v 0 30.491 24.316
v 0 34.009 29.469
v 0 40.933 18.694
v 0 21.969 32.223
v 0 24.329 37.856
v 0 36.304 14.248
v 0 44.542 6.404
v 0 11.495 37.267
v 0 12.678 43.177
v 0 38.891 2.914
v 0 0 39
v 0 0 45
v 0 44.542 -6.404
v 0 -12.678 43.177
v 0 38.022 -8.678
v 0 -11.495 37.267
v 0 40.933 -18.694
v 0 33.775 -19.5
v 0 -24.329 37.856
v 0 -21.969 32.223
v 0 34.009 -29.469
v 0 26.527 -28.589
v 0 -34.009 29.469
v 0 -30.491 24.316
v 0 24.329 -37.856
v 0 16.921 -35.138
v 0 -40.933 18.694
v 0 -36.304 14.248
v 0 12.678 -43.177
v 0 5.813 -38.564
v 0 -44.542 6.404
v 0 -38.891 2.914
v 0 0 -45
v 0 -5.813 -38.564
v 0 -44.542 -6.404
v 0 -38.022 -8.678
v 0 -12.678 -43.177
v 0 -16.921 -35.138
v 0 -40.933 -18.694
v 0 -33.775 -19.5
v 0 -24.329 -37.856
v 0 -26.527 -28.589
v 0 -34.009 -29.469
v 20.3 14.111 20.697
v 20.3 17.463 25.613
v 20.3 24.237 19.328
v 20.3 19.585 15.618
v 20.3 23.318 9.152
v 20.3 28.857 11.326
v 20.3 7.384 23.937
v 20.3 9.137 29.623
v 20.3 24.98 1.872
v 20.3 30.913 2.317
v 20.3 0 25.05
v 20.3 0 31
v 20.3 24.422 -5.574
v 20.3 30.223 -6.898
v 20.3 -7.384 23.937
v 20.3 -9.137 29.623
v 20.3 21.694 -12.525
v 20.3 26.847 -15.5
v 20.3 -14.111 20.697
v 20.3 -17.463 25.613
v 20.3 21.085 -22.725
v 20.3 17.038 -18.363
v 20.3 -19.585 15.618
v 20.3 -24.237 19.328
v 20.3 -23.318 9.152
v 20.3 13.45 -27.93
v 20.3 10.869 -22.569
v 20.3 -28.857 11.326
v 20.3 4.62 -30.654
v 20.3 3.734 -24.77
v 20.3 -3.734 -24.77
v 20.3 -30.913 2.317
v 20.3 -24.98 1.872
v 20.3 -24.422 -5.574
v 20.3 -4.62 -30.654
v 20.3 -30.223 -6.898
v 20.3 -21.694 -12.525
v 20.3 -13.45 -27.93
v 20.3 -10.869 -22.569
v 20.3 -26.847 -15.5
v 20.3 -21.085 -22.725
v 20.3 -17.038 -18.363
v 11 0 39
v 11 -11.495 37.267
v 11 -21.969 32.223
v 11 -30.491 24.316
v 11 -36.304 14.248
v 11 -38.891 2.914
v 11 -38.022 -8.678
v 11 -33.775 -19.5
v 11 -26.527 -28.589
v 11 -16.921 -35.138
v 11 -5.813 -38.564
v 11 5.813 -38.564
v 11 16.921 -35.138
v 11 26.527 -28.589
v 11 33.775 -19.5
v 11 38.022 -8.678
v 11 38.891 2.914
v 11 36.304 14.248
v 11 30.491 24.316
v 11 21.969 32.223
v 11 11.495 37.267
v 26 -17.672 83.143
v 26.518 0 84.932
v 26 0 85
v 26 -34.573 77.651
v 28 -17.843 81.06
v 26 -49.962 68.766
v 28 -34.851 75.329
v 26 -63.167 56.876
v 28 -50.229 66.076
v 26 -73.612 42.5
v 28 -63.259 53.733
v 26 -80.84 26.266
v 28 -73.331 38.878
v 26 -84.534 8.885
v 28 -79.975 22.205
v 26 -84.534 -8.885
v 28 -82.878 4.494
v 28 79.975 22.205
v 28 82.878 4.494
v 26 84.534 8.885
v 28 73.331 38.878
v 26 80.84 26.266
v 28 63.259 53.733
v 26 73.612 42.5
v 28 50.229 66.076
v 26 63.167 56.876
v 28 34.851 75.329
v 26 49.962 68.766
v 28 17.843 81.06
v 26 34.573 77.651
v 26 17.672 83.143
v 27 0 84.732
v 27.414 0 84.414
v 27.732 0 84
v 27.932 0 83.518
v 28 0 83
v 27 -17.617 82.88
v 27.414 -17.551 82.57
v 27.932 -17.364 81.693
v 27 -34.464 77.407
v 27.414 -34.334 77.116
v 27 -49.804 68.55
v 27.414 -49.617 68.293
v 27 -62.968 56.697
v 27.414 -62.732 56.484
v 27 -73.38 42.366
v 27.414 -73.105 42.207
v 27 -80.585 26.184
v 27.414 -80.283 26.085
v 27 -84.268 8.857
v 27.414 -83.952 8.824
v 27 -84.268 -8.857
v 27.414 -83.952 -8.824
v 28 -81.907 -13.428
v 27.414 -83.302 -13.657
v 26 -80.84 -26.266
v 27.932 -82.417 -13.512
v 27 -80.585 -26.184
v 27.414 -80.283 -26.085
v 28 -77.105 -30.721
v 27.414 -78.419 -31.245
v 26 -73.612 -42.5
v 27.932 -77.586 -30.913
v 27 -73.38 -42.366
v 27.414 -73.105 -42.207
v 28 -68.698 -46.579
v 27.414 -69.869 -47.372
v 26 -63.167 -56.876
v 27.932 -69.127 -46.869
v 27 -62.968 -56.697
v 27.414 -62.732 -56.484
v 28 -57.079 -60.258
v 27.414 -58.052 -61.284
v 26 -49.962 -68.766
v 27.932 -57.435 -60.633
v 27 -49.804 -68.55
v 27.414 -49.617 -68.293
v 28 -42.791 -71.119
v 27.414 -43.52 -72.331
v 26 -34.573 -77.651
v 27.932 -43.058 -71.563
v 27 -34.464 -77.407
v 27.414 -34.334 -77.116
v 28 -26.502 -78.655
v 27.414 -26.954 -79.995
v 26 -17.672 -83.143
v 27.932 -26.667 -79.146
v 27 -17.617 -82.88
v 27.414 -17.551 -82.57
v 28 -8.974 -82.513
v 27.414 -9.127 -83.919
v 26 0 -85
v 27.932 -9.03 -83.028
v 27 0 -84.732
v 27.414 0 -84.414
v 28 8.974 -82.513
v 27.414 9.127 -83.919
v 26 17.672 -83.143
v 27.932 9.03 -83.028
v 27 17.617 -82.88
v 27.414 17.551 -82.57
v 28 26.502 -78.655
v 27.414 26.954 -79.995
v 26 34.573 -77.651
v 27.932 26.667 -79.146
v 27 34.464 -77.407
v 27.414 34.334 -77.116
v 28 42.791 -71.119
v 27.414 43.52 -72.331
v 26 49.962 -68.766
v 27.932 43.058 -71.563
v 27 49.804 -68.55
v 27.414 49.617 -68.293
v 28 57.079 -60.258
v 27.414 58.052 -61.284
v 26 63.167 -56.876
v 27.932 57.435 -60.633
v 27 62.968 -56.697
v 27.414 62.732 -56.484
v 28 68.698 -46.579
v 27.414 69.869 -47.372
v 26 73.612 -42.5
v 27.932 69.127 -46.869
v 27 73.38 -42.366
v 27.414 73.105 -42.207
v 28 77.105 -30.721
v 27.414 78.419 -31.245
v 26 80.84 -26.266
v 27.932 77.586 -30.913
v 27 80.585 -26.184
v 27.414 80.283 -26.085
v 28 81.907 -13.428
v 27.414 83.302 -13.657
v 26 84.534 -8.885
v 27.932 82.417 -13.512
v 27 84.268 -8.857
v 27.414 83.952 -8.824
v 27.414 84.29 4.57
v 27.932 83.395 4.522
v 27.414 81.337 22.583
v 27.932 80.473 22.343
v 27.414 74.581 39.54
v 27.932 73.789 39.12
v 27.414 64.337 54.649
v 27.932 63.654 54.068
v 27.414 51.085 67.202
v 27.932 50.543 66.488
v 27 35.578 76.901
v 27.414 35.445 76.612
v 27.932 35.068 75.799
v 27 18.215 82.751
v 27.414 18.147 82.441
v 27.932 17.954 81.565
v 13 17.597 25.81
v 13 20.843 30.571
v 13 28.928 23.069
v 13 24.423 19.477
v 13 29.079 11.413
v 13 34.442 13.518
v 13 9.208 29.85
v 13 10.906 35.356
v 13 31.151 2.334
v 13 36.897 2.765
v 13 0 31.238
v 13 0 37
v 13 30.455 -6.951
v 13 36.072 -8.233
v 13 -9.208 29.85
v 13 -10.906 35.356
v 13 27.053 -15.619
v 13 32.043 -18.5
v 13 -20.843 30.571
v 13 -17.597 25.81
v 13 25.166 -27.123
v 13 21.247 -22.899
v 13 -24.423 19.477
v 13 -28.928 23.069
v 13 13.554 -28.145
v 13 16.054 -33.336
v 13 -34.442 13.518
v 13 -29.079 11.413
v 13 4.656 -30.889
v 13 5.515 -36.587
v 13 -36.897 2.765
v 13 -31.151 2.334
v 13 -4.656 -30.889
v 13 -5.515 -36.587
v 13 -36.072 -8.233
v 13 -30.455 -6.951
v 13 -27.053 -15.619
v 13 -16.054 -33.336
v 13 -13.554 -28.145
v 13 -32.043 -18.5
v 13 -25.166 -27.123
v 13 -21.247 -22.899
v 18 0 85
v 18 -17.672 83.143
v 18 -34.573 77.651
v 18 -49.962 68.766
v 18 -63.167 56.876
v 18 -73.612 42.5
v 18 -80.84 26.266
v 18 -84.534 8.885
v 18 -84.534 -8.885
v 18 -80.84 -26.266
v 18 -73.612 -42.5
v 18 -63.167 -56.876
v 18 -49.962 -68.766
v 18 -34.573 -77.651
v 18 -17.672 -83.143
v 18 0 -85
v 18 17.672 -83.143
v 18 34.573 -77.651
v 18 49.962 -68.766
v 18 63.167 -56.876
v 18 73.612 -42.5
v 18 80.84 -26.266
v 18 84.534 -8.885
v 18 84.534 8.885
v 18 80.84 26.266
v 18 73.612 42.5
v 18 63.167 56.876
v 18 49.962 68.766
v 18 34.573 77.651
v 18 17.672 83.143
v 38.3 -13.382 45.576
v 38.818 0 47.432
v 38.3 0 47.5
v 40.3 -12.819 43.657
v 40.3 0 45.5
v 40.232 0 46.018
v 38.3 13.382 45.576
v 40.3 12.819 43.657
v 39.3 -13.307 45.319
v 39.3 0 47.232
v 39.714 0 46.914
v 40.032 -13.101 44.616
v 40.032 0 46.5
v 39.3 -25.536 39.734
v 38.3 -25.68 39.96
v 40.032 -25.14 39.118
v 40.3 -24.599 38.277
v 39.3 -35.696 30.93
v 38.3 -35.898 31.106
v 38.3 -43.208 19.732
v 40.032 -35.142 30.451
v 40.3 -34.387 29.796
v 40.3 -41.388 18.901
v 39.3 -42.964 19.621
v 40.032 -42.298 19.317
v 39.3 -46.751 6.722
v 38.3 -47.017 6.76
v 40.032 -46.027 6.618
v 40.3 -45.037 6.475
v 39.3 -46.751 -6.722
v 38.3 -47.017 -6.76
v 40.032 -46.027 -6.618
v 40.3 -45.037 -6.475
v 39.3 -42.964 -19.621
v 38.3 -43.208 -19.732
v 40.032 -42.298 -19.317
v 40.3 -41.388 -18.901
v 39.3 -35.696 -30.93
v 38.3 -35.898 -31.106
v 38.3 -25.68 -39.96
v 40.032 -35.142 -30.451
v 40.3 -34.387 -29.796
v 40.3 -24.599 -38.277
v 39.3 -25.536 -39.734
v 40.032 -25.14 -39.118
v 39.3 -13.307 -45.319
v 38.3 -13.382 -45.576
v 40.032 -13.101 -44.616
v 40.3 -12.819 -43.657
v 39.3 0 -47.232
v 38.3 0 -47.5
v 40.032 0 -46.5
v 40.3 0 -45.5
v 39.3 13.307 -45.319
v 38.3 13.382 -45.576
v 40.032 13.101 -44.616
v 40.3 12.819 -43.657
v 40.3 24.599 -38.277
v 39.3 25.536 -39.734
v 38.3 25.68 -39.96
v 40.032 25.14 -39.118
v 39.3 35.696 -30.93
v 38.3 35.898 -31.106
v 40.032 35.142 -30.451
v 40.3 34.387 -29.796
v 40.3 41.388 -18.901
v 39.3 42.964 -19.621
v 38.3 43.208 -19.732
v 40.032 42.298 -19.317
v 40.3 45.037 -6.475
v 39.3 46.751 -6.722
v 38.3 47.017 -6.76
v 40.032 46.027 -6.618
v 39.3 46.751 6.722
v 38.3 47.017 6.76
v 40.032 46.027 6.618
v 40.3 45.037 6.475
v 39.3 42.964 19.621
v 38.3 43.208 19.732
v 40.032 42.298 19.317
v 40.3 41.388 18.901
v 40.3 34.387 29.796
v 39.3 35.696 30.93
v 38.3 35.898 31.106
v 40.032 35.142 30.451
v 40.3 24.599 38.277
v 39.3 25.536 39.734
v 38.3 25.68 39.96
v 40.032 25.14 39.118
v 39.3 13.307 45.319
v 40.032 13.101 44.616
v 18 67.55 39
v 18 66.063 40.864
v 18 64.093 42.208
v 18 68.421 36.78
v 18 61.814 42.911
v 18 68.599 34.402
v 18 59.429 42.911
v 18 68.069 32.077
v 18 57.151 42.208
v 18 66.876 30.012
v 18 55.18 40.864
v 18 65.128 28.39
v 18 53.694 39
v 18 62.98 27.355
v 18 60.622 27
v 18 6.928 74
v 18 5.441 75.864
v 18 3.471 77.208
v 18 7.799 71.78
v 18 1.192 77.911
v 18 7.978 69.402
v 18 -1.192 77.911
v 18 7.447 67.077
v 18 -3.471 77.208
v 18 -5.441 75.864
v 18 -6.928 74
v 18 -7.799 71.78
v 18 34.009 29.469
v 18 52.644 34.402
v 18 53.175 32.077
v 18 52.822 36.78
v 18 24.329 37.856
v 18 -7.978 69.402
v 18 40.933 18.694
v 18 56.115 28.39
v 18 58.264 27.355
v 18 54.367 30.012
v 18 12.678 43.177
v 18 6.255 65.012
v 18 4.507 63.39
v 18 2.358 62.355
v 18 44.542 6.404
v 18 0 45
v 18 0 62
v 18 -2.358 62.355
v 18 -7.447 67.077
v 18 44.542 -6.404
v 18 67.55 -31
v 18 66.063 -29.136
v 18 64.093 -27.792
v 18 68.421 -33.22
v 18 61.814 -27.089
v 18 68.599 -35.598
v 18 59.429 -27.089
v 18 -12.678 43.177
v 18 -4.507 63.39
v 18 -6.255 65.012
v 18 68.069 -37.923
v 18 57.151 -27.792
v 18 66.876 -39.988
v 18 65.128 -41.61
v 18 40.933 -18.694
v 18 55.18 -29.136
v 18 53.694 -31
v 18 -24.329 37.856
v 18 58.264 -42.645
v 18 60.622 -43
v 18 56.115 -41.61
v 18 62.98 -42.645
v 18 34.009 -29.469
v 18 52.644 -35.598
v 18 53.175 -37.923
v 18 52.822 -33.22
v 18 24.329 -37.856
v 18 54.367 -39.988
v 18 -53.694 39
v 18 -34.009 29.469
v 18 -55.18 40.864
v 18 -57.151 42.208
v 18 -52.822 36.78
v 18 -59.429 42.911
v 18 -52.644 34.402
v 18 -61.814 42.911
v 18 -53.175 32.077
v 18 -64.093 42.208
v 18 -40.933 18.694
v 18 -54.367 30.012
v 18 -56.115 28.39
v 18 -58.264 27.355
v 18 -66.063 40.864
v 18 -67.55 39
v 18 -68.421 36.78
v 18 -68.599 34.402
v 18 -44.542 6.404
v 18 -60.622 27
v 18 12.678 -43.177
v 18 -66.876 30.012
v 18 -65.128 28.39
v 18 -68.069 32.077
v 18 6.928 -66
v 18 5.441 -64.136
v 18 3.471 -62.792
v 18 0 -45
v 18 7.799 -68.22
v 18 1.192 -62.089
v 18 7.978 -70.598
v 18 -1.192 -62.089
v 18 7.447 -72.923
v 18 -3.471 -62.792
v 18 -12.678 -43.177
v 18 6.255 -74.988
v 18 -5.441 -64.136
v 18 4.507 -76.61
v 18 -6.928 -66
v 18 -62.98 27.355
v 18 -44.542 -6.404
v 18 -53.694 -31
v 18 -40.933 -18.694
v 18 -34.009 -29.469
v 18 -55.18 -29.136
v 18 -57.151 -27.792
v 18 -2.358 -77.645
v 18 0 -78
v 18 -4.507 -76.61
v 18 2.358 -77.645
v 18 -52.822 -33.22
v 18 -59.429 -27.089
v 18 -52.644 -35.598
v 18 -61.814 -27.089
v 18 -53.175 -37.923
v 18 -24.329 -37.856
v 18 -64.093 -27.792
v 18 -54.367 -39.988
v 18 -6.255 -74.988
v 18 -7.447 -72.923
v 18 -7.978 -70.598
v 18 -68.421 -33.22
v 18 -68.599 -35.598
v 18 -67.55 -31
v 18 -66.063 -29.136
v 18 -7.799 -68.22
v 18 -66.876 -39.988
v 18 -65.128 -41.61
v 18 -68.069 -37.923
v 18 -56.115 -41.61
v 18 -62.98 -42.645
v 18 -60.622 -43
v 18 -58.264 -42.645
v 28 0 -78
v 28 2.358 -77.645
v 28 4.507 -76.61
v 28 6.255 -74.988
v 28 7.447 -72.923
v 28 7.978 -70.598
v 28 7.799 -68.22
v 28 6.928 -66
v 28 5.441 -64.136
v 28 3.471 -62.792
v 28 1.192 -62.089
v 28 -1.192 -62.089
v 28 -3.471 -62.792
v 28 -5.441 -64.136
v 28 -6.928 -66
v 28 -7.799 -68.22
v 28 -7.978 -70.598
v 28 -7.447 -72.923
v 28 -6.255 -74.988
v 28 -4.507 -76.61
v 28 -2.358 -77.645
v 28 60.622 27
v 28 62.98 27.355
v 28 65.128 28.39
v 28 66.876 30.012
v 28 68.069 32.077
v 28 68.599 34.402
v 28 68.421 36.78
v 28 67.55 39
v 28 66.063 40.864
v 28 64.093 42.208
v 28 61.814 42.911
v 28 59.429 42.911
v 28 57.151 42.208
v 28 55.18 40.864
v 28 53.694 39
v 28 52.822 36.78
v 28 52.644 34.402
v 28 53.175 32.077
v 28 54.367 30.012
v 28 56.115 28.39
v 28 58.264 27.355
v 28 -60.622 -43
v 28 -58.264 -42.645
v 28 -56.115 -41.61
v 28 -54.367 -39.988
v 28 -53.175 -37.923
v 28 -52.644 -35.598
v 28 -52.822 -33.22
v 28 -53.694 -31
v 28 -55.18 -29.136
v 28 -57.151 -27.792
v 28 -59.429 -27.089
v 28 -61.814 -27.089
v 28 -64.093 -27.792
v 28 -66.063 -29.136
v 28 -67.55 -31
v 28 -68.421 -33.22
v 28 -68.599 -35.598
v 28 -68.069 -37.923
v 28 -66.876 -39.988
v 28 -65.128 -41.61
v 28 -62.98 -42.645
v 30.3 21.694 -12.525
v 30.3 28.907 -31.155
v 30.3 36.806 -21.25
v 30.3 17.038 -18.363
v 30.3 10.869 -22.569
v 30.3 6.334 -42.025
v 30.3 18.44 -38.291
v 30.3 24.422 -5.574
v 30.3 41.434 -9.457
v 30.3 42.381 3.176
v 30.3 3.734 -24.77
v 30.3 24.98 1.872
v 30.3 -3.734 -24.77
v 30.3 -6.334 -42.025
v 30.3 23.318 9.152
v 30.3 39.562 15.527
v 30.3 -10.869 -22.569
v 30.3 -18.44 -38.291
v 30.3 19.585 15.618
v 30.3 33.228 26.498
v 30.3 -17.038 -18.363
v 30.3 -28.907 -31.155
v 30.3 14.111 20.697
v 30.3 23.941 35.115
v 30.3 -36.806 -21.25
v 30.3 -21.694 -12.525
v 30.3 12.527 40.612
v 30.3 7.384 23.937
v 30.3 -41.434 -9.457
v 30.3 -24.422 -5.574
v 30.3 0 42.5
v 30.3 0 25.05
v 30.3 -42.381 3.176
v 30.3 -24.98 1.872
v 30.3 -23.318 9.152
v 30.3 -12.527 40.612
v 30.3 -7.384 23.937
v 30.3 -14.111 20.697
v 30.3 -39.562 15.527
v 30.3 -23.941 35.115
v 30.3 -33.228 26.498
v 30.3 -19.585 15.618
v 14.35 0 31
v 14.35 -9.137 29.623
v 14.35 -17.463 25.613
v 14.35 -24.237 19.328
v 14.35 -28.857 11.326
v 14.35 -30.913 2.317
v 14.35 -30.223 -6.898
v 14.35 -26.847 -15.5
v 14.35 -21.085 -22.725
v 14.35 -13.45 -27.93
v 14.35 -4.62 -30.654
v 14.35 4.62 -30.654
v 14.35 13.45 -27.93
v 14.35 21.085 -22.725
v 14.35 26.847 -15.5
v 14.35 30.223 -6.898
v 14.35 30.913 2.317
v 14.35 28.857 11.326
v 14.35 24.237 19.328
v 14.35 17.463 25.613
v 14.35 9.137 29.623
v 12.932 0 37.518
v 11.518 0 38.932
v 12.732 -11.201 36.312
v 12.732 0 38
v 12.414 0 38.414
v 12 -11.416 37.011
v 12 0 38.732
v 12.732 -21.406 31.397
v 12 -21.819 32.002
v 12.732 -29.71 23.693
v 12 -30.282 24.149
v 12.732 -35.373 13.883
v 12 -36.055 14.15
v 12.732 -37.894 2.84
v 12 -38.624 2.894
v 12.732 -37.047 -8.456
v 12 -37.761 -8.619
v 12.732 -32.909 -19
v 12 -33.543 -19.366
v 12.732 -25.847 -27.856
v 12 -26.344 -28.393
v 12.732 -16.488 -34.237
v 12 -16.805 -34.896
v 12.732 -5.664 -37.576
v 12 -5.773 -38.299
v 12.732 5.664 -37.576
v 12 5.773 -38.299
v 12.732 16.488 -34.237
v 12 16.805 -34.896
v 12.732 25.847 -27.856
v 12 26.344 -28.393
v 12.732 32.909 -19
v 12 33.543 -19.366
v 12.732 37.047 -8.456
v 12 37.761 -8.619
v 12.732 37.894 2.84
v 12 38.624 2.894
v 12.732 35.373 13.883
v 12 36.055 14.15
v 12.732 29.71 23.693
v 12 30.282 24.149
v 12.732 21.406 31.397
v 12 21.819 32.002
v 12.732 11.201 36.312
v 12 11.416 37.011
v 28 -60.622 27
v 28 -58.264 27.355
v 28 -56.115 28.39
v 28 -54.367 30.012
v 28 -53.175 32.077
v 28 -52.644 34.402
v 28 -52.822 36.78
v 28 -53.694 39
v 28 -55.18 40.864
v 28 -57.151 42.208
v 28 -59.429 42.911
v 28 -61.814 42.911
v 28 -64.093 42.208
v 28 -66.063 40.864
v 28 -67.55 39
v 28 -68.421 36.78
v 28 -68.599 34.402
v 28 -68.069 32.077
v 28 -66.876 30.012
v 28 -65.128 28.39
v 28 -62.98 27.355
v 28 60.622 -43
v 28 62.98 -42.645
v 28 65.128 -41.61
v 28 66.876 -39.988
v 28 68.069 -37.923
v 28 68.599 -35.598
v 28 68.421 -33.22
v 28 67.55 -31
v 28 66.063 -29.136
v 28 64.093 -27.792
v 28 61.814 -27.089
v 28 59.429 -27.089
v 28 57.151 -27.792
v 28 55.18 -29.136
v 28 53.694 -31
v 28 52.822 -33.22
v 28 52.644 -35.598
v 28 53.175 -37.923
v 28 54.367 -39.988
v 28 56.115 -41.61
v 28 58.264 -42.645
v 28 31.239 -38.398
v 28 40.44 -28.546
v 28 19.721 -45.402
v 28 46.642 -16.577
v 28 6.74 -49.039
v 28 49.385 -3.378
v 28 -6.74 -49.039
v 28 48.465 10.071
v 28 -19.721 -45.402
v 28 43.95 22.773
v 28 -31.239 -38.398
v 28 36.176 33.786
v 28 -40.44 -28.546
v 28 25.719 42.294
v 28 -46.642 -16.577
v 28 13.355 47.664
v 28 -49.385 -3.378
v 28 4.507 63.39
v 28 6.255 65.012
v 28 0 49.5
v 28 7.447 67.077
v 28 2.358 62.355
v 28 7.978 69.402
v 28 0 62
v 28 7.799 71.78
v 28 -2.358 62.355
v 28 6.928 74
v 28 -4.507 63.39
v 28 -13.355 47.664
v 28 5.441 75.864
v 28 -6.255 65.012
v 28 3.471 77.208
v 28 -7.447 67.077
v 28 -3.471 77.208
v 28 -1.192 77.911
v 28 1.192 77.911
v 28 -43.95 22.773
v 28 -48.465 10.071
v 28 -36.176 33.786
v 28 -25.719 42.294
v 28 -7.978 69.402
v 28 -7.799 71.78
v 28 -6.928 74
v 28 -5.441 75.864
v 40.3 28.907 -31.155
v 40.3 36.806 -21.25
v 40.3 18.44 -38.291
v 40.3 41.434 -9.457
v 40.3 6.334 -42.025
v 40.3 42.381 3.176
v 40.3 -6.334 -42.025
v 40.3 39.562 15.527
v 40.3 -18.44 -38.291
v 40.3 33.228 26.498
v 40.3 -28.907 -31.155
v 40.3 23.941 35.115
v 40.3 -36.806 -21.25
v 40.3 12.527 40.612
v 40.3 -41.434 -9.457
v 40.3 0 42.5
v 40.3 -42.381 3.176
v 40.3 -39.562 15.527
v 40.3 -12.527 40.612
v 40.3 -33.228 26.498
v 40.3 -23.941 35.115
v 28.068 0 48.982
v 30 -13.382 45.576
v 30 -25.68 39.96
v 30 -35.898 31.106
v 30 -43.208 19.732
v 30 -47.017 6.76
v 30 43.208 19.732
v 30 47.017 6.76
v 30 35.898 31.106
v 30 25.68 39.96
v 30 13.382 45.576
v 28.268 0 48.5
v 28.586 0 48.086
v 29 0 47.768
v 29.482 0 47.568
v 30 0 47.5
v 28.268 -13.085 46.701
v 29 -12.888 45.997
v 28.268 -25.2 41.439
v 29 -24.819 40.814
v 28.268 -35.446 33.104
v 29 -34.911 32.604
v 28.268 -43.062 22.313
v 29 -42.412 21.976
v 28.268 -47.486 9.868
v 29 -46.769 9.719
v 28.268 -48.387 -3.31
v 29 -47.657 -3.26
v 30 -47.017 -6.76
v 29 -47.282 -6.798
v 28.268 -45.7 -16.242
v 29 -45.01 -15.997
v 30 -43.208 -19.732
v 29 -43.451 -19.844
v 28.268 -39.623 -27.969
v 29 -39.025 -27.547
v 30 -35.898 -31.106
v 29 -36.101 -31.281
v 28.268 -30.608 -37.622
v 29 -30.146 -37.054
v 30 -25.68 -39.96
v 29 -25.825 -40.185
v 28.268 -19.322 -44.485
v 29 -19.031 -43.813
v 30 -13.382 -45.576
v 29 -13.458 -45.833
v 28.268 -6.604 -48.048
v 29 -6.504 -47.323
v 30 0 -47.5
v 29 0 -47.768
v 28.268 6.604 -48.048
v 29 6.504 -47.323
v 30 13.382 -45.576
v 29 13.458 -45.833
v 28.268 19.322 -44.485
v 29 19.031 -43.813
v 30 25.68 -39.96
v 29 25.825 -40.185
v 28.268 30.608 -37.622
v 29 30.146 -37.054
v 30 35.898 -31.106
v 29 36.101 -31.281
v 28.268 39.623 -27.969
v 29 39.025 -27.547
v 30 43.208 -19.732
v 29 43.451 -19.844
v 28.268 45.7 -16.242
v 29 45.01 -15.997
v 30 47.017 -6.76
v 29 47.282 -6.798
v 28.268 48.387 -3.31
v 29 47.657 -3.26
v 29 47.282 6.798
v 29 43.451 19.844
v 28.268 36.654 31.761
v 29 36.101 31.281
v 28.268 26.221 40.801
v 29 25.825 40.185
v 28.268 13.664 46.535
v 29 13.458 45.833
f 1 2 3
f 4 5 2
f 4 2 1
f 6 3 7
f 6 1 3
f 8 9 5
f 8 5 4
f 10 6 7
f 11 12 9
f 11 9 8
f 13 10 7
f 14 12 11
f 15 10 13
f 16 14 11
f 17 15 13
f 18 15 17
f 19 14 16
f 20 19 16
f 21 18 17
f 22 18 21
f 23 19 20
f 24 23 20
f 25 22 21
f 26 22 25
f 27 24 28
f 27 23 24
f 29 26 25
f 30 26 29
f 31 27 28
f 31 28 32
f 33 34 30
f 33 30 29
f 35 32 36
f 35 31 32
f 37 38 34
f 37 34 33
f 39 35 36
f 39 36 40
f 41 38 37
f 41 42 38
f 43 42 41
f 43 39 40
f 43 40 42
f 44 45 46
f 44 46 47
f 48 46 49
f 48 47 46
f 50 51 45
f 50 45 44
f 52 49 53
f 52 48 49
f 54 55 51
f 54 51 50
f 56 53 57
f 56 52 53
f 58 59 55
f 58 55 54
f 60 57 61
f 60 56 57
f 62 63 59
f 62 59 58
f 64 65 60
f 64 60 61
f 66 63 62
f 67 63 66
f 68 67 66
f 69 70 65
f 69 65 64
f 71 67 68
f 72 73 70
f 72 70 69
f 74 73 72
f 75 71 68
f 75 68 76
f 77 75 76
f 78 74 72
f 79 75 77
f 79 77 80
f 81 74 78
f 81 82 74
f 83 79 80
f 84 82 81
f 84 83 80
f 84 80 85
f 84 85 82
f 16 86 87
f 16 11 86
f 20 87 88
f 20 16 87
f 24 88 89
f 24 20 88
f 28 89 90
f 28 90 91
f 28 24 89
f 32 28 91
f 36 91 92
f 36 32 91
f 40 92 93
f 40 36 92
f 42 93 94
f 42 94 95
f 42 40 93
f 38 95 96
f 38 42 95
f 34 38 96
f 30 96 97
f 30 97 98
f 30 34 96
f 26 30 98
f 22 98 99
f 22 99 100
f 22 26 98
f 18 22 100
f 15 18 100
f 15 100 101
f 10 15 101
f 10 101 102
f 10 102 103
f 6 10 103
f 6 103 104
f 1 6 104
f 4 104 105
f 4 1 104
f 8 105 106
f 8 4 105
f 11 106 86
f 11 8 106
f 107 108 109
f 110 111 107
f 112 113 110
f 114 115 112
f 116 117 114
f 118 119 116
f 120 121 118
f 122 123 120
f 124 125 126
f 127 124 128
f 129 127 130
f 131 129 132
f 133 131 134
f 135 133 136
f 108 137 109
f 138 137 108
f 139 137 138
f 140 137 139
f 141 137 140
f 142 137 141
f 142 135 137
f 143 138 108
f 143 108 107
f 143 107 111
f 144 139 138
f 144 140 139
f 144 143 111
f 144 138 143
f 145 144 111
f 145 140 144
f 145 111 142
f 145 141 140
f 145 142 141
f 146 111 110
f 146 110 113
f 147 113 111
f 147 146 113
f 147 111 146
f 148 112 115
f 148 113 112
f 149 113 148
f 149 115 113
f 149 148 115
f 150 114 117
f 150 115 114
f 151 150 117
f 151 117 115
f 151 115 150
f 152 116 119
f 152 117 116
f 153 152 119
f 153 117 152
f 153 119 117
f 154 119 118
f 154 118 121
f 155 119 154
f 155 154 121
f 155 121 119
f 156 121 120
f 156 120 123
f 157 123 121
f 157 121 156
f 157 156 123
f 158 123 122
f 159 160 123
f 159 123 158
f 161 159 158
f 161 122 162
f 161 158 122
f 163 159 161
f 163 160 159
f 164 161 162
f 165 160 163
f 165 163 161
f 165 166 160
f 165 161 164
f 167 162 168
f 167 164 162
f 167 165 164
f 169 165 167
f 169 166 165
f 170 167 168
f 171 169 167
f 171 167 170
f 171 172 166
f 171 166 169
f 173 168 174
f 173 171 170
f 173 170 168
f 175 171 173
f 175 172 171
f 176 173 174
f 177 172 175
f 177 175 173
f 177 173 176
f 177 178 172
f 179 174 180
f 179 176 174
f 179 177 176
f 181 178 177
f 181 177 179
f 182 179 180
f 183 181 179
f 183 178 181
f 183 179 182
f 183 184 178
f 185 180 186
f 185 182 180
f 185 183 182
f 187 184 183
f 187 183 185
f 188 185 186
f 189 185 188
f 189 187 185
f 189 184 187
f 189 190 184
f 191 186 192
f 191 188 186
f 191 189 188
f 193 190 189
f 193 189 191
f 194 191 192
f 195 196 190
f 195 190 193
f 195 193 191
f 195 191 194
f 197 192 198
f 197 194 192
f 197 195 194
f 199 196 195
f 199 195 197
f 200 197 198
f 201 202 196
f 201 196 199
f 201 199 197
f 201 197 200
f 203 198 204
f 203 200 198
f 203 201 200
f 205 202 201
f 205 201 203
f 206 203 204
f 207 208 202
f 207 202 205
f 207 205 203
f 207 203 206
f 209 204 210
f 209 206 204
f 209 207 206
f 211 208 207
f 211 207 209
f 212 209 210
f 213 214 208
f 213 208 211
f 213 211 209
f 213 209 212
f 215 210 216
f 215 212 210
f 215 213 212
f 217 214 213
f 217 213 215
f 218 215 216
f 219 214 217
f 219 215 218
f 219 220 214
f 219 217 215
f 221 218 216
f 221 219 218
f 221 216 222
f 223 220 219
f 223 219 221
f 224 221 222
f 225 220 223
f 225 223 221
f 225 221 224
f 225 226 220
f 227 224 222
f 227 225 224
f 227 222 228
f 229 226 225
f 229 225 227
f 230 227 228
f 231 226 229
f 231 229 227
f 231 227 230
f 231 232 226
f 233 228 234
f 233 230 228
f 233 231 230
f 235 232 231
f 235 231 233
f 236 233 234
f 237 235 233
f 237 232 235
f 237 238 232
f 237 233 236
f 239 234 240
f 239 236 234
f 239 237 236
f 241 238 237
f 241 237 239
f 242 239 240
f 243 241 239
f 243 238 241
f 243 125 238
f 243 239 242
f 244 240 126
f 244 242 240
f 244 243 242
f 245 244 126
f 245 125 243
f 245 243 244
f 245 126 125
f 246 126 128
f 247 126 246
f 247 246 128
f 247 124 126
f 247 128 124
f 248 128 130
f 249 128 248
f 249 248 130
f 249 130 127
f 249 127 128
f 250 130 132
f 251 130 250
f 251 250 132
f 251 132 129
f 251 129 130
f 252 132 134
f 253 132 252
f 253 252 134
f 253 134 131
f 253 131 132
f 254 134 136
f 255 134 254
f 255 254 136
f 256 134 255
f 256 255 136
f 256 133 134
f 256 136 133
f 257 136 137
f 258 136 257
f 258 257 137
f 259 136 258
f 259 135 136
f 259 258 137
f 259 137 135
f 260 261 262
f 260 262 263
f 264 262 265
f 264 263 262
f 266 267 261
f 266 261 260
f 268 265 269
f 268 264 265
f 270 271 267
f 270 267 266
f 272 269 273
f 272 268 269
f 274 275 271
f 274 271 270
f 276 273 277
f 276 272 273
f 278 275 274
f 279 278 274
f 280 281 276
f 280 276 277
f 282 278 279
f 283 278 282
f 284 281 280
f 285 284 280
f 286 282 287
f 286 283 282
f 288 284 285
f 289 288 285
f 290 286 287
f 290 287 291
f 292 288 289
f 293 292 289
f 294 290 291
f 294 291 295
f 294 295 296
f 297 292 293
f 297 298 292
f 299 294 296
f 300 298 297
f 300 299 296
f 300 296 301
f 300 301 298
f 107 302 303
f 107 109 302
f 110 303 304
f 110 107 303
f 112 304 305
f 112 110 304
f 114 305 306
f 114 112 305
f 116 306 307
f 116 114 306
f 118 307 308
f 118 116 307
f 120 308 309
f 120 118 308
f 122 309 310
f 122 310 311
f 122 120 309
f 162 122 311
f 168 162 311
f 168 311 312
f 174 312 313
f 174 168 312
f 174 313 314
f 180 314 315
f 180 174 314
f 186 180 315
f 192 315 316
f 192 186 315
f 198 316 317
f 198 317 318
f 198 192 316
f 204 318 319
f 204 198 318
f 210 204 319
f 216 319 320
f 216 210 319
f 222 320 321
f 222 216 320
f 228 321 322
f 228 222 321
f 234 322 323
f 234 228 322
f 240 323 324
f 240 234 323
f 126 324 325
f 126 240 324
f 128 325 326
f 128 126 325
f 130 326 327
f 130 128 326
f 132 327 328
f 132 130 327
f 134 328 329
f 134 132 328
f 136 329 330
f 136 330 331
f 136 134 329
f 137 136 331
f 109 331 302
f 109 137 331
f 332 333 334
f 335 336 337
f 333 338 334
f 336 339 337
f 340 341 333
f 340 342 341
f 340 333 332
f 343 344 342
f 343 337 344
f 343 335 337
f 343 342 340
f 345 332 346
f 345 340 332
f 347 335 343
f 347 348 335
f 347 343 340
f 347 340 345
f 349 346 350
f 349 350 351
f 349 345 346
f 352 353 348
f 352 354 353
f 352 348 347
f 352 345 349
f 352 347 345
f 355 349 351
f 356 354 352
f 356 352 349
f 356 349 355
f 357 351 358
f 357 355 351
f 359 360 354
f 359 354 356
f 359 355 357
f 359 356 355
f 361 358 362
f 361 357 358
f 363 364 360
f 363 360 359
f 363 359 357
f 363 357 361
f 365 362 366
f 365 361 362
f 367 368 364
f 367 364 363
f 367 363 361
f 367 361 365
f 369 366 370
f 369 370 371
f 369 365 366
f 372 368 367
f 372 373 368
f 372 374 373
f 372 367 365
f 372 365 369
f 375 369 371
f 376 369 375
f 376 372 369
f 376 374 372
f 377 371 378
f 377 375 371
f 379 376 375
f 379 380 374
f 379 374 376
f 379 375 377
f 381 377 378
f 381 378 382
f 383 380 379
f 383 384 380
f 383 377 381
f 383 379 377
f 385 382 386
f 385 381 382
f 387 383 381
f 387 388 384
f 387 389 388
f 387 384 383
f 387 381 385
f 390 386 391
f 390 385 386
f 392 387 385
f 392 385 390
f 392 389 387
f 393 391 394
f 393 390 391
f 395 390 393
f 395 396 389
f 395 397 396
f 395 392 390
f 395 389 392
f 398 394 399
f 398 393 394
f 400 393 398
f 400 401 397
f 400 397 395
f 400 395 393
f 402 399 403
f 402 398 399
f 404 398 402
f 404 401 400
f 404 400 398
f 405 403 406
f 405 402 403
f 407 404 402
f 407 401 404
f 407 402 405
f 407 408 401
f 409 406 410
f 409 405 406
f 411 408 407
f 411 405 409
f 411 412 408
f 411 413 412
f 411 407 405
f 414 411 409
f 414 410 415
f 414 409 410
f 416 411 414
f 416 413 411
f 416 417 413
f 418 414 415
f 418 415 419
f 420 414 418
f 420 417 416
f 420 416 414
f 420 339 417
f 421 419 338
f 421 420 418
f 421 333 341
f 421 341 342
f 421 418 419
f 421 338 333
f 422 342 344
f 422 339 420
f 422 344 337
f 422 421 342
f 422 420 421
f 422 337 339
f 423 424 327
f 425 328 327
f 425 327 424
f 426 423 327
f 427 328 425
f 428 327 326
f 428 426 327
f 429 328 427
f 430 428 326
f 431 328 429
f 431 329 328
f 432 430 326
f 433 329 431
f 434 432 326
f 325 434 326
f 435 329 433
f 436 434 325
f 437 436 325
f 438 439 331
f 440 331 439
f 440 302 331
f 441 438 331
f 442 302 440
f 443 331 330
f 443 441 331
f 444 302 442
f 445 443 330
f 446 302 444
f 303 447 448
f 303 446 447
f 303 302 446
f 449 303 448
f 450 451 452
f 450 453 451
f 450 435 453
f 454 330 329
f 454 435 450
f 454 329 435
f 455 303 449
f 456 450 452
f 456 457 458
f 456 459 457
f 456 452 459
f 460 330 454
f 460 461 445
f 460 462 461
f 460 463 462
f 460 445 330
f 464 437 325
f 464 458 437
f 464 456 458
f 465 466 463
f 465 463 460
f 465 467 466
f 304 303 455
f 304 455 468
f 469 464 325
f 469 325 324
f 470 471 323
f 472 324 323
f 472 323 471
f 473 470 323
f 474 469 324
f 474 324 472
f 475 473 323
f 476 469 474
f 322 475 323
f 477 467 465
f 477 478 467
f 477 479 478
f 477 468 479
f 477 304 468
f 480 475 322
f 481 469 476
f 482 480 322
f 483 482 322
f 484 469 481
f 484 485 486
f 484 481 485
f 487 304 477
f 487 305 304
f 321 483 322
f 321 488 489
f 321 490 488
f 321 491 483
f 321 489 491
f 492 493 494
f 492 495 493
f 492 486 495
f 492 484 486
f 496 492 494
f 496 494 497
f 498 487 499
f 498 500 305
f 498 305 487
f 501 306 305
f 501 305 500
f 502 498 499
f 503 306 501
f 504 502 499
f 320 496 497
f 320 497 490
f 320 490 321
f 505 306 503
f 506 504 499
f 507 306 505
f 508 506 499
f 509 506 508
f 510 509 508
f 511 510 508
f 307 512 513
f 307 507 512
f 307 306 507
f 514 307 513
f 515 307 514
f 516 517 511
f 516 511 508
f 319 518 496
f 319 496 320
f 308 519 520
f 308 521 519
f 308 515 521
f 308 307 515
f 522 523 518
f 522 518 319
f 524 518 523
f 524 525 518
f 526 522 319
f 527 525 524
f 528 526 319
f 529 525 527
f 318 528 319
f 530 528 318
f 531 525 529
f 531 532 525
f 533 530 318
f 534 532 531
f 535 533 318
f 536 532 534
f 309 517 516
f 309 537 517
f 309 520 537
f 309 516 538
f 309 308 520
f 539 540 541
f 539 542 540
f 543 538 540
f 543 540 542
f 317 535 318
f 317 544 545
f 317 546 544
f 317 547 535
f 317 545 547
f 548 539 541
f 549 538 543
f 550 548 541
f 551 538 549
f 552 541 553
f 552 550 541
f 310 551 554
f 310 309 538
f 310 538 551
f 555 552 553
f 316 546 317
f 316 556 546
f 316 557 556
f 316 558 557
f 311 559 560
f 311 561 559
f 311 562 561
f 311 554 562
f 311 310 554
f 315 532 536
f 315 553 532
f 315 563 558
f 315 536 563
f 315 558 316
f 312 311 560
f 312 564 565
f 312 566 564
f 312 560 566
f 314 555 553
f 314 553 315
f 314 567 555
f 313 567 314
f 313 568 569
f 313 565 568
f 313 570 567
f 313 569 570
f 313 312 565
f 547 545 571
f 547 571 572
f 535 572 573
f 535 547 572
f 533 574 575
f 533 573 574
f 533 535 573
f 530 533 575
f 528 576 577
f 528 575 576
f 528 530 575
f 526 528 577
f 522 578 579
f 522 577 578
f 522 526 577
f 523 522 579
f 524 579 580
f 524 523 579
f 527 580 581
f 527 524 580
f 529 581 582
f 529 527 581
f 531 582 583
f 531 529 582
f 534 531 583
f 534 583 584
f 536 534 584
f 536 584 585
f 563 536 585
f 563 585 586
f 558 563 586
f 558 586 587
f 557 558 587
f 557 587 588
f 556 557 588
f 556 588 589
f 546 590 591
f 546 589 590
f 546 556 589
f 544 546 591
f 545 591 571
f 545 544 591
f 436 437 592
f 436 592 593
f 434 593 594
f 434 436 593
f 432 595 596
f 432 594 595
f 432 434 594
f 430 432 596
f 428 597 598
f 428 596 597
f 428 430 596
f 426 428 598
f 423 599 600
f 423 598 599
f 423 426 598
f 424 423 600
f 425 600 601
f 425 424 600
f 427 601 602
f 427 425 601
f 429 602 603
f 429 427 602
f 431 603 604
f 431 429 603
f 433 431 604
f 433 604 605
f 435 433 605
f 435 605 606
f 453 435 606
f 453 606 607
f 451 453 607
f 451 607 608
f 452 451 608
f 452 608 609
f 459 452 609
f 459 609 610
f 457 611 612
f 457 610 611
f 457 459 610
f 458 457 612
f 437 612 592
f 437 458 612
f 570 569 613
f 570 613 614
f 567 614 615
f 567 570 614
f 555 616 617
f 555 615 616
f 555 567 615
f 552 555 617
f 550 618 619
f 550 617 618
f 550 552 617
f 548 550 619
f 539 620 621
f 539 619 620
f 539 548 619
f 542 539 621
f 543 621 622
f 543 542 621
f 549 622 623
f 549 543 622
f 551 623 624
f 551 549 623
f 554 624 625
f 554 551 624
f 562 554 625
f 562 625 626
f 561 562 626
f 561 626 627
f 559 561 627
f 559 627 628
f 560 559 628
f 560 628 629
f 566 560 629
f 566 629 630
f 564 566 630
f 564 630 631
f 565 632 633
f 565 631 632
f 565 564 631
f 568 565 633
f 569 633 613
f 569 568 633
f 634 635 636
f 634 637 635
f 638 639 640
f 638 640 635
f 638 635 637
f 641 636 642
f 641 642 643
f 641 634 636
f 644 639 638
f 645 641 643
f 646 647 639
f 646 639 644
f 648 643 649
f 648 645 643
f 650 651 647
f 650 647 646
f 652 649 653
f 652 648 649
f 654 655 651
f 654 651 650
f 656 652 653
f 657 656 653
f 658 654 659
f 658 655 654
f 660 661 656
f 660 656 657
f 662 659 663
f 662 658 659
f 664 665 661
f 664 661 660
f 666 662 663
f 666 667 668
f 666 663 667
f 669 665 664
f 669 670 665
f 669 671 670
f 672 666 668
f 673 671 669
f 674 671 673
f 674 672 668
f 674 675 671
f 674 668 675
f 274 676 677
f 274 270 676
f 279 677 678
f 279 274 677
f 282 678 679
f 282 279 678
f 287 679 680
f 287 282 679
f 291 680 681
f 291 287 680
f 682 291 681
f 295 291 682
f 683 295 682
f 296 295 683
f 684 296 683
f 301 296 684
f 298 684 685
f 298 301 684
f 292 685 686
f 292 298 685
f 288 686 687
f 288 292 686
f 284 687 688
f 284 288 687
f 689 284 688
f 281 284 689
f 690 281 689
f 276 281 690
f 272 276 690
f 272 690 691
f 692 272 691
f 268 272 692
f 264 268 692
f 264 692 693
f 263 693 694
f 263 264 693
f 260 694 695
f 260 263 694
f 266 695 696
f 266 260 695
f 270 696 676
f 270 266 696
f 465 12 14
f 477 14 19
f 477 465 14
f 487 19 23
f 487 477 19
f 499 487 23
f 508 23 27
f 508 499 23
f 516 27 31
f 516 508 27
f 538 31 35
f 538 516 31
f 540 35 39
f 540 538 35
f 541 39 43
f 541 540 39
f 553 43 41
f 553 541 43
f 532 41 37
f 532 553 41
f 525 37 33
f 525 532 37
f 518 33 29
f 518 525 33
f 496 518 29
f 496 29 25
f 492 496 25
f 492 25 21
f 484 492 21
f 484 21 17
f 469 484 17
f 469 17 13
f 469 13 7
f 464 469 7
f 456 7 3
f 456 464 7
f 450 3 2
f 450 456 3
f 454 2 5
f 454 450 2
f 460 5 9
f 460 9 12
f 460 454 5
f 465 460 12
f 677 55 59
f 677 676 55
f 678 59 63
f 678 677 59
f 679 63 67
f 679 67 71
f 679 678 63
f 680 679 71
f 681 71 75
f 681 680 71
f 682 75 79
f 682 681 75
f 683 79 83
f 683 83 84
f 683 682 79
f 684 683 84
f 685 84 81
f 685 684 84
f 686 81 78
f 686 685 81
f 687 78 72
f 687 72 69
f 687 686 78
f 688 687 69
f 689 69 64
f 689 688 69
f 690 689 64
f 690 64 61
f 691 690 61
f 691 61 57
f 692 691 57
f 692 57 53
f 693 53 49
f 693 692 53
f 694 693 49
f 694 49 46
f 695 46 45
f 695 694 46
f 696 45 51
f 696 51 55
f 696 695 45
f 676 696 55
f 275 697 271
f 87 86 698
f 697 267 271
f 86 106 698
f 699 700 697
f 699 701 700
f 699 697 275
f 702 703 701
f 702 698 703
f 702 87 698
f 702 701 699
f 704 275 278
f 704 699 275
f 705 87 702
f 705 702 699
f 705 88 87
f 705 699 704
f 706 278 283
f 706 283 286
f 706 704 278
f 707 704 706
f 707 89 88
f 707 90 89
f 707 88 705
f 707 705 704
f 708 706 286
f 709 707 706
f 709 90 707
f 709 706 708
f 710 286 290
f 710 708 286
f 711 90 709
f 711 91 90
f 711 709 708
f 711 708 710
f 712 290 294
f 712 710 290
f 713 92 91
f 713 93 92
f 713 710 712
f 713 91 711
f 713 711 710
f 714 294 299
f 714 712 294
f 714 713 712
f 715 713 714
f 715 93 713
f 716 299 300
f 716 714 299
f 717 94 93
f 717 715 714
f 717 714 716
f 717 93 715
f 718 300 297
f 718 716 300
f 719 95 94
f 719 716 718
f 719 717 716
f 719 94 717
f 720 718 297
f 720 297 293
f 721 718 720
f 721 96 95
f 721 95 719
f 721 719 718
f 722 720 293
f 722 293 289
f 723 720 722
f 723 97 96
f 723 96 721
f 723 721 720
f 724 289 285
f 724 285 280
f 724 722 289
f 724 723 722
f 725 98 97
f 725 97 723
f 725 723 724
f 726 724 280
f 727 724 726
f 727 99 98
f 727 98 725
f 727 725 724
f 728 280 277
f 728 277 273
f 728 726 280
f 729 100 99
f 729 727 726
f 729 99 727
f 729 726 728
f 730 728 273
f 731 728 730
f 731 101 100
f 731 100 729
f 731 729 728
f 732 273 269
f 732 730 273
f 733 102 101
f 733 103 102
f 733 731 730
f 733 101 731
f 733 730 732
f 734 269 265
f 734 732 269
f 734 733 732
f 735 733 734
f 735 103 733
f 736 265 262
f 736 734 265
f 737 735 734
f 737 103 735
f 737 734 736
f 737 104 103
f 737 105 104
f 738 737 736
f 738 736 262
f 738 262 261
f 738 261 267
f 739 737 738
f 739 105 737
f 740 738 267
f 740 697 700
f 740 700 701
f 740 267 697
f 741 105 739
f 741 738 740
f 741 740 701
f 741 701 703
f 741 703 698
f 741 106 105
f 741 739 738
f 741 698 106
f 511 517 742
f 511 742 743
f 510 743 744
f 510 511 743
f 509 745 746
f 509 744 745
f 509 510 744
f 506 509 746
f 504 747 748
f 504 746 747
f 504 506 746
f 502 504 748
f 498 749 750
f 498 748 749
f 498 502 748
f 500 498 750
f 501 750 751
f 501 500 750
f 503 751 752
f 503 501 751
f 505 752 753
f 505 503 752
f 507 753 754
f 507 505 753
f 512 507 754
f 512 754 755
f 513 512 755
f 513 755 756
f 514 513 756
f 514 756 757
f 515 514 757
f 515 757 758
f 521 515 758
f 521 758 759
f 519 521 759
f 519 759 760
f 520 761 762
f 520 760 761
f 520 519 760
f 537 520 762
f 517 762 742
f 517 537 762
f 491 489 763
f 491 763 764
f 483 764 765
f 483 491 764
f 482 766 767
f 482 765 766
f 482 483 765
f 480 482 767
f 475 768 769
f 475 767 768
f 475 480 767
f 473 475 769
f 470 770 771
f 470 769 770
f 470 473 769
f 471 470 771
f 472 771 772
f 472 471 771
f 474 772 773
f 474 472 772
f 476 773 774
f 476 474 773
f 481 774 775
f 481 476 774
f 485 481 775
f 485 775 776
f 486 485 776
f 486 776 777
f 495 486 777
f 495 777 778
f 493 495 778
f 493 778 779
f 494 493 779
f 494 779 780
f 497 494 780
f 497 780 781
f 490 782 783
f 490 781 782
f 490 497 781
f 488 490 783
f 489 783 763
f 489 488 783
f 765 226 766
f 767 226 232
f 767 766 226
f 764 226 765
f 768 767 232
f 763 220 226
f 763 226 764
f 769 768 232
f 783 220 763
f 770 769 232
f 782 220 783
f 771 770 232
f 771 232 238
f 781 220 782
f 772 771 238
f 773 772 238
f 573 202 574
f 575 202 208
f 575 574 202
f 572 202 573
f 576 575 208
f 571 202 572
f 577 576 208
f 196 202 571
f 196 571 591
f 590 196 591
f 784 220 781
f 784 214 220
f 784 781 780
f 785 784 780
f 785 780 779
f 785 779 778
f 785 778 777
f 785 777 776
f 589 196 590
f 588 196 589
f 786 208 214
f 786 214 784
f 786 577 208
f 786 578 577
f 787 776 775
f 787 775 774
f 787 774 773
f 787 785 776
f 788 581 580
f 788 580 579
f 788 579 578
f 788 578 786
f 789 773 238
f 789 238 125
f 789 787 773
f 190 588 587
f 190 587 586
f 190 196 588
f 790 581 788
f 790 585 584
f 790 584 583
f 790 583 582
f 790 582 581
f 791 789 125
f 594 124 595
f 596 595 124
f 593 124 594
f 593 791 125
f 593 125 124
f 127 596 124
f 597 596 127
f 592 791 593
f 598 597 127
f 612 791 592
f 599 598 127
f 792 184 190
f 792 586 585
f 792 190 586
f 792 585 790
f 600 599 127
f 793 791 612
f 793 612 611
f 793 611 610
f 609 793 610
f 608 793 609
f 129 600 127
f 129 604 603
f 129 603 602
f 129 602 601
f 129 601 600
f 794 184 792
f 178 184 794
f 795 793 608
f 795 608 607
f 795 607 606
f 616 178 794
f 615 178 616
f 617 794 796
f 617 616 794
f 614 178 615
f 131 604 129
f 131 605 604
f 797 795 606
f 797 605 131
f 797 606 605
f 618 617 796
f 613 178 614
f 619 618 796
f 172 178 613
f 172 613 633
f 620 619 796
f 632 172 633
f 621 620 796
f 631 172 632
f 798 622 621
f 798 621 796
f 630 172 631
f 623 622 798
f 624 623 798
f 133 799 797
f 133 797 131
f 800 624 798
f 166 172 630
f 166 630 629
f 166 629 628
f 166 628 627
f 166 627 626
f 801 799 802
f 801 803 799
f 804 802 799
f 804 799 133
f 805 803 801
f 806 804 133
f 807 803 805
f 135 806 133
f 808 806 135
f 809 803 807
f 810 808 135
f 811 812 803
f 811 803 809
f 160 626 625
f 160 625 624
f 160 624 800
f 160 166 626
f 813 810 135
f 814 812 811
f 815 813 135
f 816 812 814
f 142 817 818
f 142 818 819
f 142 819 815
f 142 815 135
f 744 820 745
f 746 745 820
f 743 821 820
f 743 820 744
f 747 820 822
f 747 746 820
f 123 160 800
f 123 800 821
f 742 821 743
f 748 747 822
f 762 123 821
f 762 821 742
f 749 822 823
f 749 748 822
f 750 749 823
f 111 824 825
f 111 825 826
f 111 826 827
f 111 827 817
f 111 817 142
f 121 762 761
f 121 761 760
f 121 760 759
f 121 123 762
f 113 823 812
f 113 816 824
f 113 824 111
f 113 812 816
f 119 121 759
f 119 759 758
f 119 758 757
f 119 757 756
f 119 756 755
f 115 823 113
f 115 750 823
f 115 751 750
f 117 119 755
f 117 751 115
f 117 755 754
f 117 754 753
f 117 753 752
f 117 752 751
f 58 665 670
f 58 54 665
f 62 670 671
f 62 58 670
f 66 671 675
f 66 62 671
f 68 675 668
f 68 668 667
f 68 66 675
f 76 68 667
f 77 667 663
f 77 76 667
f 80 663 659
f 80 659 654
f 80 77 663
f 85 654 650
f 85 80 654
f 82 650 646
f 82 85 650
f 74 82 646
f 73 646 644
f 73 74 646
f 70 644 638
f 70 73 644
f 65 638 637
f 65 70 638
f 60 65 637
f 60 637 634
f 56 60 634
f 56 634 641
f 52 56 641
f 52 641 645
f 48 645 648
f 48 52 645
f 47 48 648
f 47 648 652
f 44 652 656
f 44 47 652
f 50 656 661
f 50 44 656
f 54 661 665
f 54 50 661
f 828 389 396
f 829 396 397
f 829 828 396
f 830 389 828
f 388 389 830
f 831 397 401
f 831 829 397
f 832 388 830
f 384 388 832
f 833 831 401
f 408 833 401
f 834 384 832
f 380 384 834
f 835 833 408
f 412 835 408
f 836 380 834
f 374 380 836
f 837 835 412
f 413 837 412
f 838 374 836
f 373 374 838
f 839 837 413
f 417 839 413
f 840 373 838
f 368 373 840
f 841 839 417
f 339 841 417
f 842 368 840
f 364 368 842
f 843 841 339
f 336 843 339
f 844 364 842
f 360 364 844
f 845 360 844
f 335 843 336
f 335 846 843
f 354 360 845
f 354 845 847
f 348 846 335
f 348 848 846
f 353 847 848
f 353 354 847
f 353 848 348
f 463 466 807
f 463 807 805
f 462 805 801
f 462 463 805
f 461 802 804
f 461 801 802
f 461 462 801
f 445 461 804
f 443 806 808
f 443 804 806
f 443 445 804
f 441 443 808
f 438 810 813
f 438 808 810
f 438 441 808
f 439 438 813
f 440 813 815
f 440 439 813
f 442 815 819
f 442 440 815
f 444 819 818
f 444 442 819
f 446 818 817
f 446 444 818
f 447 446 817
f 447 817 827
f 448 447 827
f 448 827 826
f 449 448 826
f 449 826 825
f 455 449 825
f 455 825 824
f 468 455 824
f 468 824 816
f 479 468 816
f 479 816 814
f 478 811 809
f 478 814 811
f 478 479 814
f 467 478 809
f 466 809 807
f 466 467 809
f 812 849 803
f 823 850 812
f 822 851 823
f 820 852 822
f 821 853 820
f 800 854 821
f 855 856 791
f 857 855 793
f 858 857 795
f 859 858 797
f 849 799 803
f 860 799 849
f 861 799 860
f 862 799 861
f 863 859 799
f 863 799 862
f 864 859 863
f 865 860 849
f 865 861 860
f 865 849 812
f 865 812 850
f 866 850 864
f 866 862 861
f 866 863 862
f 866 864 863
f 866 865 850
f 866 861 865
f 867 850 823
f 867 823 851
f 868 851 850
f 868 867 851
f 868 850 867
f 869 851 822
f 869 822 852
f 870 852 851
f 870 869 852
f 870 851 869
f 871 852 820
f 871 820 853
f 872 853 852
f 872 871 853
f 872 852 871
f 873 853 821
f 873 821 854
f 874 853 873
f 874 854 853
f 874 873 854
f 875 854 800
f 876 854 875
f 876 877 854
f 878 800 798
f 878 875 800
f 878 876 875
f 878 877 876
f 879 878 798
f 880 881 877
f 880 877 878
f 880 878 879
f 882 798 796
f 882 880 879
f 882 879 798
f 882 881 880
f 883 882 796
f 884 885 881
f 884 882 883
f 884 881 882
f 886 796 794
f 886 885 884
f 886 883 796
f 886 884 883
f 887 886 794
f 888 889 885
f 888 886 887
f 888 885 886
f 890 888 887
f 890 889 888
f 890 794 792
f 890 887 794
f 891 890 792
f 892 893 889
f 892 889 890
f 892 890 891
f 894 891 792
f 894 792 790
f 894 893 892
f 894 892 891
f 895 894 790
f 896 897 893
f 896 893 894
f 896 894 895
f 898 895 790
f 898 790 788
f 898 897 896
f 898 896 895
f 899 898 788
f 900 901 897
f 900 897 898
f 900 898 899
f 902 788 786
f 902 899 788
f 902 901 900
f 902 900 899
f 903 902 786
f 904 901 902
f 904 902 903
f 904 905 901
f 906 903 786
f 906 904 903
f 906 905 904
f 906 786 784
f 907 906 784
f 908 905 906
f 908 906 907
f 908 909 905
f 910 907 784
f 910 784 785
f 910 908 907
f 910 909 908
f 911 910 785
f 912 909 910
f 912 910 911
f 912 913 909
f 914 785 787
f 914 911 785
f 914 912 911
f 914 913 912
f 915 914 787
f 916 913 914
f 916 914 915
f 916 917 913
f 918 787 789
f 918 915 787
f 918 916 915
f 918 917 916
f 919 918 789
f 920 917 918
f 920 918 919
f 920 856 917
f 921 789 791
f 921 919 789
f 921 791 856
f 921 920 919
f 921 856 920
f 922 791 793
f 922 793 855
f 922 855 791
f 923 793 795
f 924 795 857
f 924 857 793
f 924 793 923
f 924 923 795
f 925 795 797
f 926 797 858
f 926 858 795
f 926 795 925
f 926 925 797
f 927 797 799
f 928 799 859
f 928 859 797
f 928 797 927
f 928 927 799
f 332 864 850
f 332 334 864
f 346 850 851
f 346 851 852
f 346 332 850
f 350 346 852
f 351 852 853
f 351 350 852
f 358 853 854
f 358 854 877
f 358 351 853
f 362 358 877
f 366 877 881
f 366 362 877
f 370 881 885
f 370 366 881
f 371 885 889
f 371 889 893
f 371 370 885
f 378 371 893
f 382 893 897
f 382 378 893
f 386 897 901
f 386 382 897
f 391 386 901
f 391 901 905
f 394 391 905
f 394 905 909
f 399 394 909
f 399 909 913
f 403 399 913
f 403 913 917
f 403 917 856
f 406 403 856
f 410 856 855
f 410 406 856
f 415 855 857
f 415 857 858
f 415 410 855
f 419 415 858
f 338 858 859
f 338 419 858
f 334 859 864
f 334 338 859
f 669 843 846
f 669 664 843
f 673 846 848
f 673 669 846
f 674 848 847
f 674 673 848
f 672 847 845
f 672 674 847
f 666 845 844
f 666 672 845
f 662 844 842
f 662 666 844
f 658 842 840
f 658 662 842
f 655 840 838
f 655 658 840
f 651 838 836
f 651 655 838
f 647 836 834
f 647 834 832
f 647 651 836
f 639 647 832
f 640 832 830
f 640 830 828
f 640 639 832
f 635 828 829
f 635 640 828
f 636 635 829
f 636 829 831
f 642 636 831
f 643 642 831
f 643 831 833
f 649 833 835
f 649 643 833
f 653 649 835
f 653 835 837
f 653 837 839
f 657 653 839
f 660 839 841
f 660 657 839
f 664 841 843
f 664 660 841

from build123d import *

# Parameters (mm, degrees)
CUT_EXTRUDE1_DEPTH      = 124.426091245
CUT_EXTRUDE1_DEPTH_BACK = 124.426091245
SKETCH2_R               = 8


with BuildPart() as part:
    # Sketch1 → Revolve1 (revolve)
    with BuildSketch(Plane.XY, mode=Mode.PRIVATE) as revolve1_sk:
        with BuildLine():
            Line((0, 45), (18, 45))
            Line((18, 45), (18, 85))
            Line((18, 85), (26, 85))
            ThreePointArc((26, 85), (27.414213562, 84.414213562), (28, 83))
            Line((28, 83), (28, 49.5))
            ThreePointArc((28, 49.5), (28.585786438, 48.085786438), (30, 47.5))
            Line((30, 47.5), (38.3, 47.5))
            ThreePointArc((38.3, 47.5), (39.714213562, 46.914213562), (40.3, 45.5))
            Line((40.3, 45.5), (40.3, 42.5))
            Line((40.3, 42.5), (30.3, 42.5))
            Line((30.3, 42.5), (30.3, 25.05))
            Line((30.3, 25.05), (20.3, 25.05))
            Line((20.3, 25.05), (20.3, 31))
            Line((20.3, 31), (14.35, 31))
            Line((14.35, 31), (13, 31.238041424))
            Line((13, 31.238041424), (13, 37))
            ThreePointArc((13, 37), (12.414213562, 38.414213562), (11, 39))
            Line((11, 39), (0, 39))
            Line((0, 39), (0, 45))
        make_face()
    revolve(revolve1_sk.sketch.rotate(Axis((0, 0, 0), (1, 0, 0)), 90), axis=Axis((0, 0, 0), (1, 0, 0)))

    # Sketch2 → Cut-Extrude1 (cut, two sides: drawn at the far end of the back side and taken through both)
    with BuildSketch(Plane(origin=(28, 0, 0), x_dir=(0, 0, -1), z_dir=(1, 0, 0)).offset(-CUT_EXTRUDE1_DEPTH_BACK)):
        with Locations((70, 0)):
            Circle(SKETCH2_R)
        with Locations((35, -60.621778265)):
            Circle(SKETCH2_R)
        with Locations((-35, -60.621778265)):
            Circle(SKETCH2_R)
        with Locations((-70, 0)):
            Circle(SKETCH2_R)
        with Locations((-35, 60.621778265)):
            Circle(SKETCH2_R)
        with Locations((35, 60.621778265)):
            Circle(SKETCH2_R)
    extrude(amount=CUT_EXTRUDE1_DEPTH + CUT_EXTRUDE1_DEPTH_BACK, mode=Mode.SUBTRACT)


solid = part.part
